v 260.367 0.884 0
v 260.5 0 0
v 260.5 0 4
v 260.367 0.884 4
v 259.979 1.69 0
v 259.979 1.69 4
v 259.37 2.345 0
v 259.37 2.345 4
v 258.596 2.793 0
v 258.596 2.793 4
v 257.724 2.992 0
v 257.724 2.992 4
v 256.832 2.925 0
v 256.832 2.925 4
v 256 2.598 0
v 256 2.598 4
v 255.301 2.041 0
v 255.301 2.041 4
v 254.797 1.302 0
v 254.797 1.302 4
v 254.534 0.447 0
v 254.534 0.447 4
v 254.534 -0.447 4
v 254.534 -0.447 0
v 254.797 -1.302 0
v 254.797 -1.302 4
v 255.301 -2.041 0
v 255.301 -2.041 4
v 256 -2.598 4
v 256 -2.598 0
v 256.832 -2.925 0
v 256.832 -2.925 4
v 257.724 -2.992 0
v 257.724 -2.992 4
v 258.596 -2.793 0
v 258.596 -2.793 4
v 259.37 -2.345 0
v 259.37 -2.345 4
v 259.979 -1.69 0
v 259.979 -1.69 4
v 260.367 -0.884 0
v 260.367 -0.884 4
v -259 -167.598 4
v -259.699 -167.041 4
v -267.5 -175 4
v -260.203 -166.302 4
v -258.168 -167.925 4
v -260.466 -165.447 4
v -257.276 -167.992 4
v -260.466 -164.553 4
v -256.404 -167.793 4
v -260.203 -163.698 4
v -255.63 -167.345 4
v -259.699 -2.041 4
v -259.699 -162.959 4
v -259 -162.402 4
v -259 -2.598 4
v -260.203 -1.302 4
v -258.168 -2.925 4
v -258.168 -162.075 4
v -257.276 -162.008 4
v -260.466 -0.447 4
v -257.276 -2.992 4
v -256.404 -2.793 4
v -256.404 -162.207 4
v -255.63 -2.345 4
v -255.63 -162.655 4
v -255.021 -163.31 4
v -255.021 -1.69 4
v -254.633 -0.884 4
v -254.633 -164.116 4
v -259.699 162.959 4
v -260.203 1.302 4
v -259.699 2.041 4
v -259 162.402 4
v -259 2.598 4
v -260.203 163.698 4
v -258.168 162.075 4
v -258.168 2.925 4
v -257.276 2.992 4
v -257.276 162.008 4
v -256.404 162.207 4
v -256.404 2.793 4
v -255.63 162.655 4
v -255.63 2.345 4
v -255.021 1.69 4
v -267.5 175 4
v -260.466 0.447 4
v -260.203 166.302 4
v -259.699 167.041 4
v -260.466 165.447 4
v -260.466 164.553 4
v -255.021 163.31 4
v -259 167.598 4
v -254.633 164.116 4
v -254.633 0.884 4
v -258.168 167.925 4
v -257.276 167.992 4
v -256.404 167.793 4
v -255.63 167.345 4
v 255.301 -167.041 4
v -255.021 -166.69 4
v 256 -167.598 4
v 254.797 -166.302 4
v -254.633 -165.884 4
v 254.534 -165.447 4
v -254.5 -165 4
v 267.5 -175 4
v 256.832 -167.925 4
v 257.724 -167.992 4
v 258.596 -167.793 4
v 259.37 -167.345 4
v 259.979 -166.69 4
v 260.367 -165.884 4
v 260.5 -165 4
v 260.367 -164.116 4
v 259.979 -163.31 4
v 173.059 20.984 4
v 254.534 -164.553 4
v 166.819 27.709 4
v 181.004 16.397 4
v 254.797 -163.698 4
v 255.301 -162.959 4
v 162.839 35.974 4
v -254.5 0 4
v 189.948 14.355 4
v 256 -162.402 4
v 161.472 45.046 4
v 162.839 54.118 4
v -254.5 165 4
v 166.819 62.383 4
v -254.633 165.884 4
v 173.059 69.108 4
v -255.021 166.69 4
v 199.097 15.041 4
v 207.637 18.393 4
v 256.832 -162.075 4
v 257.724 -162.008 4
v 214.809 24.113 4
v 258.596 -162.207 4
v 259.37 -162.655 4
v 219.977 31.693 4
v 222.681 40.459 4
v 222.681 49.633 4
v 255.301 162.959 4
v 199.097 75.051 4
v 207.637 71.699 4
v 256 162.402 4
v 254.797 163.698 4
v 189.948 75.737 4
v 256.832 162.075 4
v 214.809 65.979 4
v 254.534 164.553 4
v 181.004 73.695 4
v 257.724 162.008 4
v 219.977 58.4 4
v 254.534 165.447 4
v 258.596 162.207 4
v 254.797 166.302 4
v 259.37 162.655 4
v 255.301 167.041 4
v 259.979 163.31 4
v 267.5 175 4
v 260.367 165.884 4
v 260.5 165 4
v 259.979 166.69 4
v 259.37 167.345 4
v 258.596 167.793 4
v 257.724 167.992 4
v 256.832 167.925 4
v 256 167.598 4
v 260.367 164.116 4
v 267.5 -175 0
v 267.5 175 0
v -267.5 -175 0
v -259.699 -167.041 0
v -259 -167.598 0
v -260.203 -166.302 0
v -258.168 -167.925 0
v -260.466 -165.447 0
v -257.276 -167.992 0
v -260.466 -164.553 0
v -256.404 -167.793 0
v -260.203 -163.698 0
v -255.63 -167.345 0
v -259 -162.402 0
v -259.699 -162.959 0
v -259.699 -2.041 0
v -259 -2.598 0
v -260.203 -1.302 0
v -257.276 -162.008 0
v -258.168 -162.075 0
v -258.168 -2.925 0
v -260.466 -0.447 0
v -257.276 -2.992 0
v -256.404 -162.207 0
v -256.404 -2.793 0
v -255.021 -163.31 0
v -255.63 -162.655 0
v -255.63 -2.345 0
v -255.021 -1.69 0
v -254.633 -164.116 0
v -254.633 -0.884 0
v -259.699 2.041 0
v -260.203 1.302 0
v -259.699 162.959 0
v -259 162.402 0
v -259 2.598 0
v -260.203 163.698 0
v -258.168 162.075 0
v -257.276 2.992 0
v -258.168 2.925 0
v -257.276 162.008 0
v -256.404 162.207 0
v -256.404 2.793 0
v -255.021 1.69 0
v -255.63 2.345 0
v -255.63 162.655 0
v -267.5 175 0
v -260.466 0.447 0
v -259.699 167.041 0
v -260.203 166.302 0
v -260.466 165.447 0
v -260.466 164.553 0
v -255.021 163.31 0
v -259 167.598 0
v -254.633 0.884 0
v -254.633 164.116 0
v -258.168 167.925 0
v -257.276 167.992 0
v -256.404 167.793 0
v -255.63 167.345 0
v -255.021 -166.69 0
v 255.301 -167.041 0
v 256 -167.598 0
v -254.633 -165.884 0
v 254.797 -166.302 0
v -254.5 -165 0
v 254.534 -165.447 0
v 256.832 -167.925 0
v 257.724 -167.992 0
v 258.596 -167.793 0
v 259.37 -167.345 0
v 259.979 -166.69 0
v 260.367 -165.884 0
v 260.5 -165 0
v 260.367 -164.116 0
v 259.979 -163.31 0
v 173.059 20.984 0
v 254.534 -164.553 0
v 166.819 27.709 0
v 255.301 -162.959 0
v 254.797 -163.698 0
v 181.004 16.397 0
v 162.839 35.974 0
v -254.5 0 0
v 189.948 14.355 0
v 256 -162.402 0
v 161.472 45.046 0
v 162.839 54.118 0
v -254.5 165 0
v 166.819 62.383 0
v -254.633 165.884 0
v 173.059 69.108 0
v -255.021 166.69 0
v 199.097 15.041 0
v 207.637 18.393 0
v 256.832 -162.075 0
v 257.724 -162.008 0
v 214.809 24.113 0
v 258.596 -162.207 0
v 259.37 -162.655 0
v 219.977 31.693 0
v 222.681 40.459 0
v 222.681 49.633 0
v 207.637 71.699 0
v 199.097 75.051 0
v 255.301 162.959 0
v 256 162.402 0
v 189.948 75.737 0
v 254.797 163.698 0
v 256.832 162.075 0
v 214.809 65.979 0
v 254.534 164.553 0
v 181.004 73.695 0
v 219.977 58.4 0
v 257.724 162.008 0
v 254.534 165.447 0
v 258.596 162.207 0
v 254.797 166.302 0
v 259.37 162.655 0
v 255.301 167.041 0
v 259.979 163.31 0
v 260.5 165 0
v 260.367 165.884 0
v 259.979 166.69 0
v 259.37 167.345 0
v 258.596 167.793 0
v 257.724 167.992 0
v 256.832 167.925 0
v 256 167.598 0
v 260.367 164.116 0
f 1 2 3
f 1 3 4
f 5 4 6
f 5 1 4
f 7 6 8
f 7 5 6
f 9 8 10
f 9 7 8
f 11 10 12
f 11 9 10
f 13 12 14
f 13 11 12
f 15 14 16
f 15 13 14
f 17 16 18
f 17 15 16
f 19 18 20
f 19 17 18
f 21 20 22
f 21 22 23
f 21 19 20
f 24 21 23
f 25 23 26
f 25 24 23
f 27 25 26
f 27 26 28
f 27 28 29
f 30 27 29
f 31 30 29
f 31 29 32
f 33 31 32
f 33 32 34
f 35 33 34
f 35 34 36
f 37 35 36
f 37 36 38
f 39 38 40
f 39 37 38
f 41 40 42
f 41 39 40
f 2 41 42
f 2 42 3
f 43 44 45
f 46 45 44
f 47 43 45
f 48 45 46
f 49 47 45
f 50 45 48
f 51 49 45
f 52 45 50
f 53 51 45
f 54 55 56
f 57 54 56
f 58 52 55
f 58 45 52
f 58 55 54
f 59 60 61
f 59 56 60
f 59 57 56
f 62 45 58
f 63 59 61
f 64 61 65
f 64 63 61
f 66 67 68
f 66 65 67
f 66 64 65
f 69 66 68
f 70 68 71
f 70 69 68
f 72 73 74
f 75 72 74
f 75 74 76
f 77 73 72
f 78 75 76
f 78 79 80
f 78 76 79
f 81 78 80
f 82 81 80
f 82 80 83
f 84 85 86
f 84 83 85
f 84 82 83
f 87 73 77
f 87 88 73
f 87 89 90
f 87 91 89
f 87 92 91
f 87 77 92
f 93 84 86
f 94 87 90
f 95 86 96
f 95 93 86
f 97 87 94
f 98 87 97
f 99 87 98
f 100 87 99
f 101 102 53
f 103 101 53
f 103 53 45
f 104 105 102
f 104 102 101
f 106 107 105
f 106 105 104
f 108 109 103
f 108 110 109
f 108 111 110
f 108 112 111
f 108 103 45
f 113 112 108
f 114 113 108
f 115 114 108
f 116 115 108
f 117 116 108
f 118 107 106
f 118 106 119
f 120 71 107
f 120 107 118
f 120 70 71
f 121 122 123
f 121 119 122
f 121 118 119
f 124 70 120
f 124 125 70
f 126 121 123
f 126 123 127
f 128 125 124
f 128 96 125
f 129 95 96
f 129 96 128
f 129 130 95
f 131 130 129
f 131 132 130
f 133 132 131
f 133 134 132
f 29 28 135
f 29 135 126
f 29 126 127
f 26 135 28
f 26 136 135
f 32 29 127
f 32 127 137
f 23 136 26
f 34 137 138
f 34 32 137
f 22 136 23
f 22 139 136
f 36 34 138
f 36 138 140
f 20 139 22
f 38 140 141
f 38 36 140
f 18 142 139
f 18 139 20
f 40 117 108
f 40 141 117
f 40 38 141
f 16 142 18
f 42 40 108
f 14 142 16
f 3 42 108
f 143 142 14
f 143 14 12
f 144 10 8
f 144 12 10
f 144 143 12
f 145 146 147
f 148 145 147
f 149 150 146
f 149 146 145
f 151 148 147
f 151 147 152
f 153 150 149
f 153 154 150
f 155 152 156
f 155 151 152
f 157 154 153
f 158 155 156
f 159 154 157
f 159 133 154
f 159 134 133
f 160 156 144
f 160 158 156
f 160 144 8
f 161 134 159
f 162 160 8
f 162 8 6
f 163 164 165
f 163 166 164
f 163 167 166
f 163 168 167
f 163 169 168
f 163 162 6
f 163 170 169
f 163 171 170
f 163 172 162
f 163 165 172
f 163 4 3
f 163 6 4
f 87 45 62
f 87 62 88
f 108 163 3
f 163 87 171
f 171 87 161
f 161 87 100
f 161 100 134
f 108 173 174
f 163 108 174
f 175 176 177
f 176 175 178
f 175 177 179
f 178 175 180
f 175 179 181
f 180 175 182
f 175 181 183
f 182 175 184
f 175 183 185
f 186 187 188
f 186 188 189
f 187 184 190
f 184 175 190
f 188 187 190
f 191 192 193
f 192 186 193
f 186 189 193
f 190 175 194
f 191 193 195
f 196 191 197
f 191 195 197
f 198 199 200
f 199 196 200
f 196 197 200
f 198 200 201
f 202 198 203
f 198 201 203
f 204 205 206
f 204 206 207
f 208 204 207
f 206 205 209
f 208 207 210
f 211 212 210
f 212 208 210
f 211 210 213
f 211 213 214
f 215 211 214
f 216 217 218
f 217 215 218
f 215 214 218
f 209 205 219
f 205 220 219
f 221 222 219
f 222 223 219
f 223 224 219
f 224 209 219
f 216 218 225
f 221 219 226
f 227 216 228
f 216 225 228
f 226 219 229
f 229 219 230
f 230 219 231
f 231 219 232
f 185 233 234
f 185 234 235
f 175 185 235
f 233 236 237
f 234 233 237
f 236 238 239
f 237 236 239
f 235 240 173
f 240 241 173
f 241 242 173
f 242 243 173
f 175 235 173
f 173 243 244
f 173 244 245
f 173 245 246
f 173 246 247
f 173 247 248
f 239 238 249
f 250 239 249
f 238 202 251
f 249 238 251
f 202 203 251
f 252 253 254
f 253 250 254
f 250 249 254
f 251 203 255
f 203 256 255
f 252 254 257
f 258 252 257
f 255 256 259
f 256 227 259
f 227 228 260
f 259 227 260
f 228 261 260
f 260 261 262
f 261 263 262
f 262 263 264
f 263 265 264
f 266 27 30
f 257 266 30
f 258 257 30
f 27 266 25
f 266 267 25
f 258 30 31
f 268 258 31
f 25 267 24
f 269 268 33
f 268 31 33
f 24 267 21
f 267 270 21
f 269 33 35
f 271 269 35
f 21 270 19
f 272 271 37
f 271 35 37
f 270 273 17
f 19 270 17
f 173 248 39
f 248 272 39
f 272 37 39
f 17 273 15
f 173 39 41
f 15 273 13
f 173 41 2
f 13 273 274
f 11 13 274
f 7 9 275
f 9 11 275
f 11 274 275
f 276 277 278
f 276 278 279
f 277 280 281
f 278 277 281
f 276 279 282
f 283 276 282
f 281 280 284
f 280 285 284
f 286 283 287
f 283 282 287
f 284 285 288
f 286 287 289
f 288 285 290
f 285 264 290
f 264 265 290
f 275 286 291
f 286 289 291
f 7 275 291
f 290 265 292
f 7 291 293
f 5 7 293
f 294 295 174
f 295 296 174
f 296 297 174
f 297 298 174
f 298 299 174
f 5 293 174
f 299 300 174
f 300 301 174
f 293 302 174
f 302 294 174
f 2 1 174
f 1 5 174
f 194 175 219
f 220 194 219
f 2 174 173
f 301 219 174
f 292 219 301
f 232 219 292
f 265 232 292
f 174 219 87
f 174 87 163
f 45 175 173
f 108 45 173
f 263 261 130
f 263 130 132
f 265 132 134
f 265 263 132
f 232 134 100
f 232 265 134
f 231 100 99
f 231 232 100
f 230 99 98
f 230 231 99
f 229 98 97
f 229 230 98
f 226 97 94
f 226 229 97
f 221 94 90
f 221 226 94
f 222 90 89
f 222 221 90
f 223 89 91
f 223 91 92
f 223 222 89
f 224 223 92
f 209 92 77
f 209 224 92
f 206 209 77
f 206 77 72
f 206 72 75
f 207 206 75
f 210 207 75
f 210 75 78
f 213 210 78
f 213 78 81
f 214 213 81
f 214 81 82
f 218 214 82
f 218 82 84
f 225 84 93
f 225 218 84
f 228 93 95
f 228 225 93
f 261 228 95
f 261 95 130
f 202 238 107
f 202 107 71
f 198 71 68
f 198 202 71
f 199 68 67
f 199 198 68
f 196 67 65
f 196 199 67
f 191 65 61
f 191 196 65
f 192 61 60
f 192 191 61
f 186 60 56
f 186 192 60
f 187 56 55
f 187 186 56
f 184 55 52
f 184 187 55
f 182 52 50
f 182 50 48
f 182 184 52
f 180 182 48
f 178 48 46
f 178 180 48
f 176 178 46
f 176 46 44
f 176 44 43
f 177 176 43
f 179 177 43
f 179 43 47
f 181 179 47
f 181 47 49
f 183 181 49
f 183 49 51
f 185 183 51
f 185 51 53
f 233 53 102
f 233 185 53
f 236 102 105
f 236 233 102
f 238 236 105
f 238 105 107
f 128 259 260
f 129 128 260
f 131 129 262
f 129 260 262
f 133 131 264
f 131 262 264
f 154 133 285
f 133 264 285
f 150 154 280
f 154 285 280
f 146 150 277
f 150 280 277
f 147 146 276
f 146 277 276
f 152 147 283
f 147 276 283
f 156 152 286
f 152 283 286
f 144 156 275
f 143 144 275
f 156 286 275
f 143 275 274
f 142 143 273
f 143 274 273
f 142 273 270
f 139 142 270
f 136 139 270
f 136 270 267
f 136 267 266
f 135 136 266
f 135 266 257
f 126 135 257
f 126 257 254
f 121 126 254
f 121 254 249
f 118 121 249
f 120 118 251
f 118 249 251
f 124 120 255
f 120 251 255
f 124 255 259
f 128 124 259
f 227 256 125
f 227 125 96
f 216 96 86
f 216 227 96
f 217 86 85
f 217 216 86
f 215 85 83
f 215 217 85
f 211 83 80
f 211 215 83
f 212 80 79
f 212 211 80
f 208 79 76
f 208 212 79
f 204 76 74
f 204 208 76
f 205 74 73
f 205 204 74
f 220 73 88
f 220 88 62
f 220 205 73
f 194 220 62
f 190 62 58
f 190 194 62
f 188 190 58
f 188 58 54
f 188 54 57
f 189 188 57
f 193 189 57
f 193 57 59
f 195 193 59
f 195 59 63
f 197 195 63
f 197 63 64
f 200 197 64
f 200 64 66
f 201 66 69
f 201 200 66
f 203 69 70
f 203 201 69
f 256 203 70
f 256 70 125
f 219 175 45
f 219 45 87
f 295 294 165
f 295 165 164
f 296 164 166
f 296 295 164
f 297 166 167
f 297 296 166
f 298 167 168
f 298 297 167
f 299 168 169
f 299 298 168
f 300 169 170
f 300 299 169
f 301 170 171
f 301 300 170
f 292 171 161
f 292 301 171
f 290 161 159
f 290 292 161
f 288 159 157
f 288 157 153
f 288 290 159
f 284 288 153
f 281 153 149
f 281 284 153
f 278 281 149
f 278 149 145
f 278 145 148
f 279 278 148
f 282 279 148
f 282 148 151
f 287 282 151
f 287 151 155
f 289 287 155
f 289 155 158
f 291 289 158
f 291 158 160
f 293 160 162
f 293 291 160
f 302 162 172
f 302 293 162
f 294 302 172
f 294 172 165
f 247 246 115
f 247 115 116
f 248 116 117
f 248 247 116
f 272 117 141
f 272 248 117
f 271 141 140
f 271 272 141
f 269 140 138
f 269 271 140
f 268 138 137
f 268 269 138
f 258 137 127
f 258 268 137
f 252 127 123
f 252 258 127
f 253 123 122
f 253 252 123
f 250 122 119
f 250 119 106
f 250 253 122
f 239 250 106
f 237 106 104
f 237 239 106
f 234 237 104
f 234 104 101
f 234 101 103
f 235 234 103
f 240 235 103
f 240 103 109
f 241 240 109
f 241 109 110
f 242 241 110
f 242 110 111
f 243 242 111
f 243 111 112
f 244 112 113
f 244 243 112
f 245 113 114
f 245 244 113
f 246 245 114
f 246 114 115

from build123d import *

# Parameters (mm, degrees)
SKICA1_W                 = 535
SKICA1_H                 = 350
SKICA1_R                 = 3
P_IDAT_VYSUNUT_M1_DEPTH  = 4
SKICA2_R                 = 30.776653742
ODEBRAT_VYSUNUT_M1_DEPTH = 4


with BuildPart() as part:
    # Skica1 → Přidat vysunutím1 (new body)
    with BuildSketch(Plane.XY):
        Rectangle(SKICA1_W, SKICA1_H)
        with Locations((-257.5, 165)):
            Circle(SKICA1_R, mode=Mode.SUBTRACT)
        with Locations((-257.5, 0)):
            Circle(SKICA1_R, mode=Mode.SUBTRACT)
        with Locations((-257.5, -165)):
            Circle(SKICA1_R, mode=Mode.SUBTRACT)
        with Locations((257.5, 165)):
            Circle(SKICA1_R, mode=Mode.SUBTRACT)
        with Locations((257.5, 0)):
            Circle(SKICA1_R, mode=Mode.SUBTRACT)
        with Locations((257.5, -165)):
            Circle(SKICA1_R, mode=Mode.SUBTRACT)
    extrude(amount=P_IDAT_VYSUNUT_M1_DEPTH)

    # Skica2 → Odebrat vysunutím1 (cut)
    with BuildSketch(Plane(origin=(0, 0, 0), x_dir=(-1, 0, 0), z_dir=(0, 0, -1))):
        with Locations((-192.248320425, 45.04602447)):
            Circle(SKICA2_R)
    extrude(amount=-ODEBRAT_VYSUNUT_M1_DEPTH, mode=Mode.SUBTRACT)


solid = part.part
